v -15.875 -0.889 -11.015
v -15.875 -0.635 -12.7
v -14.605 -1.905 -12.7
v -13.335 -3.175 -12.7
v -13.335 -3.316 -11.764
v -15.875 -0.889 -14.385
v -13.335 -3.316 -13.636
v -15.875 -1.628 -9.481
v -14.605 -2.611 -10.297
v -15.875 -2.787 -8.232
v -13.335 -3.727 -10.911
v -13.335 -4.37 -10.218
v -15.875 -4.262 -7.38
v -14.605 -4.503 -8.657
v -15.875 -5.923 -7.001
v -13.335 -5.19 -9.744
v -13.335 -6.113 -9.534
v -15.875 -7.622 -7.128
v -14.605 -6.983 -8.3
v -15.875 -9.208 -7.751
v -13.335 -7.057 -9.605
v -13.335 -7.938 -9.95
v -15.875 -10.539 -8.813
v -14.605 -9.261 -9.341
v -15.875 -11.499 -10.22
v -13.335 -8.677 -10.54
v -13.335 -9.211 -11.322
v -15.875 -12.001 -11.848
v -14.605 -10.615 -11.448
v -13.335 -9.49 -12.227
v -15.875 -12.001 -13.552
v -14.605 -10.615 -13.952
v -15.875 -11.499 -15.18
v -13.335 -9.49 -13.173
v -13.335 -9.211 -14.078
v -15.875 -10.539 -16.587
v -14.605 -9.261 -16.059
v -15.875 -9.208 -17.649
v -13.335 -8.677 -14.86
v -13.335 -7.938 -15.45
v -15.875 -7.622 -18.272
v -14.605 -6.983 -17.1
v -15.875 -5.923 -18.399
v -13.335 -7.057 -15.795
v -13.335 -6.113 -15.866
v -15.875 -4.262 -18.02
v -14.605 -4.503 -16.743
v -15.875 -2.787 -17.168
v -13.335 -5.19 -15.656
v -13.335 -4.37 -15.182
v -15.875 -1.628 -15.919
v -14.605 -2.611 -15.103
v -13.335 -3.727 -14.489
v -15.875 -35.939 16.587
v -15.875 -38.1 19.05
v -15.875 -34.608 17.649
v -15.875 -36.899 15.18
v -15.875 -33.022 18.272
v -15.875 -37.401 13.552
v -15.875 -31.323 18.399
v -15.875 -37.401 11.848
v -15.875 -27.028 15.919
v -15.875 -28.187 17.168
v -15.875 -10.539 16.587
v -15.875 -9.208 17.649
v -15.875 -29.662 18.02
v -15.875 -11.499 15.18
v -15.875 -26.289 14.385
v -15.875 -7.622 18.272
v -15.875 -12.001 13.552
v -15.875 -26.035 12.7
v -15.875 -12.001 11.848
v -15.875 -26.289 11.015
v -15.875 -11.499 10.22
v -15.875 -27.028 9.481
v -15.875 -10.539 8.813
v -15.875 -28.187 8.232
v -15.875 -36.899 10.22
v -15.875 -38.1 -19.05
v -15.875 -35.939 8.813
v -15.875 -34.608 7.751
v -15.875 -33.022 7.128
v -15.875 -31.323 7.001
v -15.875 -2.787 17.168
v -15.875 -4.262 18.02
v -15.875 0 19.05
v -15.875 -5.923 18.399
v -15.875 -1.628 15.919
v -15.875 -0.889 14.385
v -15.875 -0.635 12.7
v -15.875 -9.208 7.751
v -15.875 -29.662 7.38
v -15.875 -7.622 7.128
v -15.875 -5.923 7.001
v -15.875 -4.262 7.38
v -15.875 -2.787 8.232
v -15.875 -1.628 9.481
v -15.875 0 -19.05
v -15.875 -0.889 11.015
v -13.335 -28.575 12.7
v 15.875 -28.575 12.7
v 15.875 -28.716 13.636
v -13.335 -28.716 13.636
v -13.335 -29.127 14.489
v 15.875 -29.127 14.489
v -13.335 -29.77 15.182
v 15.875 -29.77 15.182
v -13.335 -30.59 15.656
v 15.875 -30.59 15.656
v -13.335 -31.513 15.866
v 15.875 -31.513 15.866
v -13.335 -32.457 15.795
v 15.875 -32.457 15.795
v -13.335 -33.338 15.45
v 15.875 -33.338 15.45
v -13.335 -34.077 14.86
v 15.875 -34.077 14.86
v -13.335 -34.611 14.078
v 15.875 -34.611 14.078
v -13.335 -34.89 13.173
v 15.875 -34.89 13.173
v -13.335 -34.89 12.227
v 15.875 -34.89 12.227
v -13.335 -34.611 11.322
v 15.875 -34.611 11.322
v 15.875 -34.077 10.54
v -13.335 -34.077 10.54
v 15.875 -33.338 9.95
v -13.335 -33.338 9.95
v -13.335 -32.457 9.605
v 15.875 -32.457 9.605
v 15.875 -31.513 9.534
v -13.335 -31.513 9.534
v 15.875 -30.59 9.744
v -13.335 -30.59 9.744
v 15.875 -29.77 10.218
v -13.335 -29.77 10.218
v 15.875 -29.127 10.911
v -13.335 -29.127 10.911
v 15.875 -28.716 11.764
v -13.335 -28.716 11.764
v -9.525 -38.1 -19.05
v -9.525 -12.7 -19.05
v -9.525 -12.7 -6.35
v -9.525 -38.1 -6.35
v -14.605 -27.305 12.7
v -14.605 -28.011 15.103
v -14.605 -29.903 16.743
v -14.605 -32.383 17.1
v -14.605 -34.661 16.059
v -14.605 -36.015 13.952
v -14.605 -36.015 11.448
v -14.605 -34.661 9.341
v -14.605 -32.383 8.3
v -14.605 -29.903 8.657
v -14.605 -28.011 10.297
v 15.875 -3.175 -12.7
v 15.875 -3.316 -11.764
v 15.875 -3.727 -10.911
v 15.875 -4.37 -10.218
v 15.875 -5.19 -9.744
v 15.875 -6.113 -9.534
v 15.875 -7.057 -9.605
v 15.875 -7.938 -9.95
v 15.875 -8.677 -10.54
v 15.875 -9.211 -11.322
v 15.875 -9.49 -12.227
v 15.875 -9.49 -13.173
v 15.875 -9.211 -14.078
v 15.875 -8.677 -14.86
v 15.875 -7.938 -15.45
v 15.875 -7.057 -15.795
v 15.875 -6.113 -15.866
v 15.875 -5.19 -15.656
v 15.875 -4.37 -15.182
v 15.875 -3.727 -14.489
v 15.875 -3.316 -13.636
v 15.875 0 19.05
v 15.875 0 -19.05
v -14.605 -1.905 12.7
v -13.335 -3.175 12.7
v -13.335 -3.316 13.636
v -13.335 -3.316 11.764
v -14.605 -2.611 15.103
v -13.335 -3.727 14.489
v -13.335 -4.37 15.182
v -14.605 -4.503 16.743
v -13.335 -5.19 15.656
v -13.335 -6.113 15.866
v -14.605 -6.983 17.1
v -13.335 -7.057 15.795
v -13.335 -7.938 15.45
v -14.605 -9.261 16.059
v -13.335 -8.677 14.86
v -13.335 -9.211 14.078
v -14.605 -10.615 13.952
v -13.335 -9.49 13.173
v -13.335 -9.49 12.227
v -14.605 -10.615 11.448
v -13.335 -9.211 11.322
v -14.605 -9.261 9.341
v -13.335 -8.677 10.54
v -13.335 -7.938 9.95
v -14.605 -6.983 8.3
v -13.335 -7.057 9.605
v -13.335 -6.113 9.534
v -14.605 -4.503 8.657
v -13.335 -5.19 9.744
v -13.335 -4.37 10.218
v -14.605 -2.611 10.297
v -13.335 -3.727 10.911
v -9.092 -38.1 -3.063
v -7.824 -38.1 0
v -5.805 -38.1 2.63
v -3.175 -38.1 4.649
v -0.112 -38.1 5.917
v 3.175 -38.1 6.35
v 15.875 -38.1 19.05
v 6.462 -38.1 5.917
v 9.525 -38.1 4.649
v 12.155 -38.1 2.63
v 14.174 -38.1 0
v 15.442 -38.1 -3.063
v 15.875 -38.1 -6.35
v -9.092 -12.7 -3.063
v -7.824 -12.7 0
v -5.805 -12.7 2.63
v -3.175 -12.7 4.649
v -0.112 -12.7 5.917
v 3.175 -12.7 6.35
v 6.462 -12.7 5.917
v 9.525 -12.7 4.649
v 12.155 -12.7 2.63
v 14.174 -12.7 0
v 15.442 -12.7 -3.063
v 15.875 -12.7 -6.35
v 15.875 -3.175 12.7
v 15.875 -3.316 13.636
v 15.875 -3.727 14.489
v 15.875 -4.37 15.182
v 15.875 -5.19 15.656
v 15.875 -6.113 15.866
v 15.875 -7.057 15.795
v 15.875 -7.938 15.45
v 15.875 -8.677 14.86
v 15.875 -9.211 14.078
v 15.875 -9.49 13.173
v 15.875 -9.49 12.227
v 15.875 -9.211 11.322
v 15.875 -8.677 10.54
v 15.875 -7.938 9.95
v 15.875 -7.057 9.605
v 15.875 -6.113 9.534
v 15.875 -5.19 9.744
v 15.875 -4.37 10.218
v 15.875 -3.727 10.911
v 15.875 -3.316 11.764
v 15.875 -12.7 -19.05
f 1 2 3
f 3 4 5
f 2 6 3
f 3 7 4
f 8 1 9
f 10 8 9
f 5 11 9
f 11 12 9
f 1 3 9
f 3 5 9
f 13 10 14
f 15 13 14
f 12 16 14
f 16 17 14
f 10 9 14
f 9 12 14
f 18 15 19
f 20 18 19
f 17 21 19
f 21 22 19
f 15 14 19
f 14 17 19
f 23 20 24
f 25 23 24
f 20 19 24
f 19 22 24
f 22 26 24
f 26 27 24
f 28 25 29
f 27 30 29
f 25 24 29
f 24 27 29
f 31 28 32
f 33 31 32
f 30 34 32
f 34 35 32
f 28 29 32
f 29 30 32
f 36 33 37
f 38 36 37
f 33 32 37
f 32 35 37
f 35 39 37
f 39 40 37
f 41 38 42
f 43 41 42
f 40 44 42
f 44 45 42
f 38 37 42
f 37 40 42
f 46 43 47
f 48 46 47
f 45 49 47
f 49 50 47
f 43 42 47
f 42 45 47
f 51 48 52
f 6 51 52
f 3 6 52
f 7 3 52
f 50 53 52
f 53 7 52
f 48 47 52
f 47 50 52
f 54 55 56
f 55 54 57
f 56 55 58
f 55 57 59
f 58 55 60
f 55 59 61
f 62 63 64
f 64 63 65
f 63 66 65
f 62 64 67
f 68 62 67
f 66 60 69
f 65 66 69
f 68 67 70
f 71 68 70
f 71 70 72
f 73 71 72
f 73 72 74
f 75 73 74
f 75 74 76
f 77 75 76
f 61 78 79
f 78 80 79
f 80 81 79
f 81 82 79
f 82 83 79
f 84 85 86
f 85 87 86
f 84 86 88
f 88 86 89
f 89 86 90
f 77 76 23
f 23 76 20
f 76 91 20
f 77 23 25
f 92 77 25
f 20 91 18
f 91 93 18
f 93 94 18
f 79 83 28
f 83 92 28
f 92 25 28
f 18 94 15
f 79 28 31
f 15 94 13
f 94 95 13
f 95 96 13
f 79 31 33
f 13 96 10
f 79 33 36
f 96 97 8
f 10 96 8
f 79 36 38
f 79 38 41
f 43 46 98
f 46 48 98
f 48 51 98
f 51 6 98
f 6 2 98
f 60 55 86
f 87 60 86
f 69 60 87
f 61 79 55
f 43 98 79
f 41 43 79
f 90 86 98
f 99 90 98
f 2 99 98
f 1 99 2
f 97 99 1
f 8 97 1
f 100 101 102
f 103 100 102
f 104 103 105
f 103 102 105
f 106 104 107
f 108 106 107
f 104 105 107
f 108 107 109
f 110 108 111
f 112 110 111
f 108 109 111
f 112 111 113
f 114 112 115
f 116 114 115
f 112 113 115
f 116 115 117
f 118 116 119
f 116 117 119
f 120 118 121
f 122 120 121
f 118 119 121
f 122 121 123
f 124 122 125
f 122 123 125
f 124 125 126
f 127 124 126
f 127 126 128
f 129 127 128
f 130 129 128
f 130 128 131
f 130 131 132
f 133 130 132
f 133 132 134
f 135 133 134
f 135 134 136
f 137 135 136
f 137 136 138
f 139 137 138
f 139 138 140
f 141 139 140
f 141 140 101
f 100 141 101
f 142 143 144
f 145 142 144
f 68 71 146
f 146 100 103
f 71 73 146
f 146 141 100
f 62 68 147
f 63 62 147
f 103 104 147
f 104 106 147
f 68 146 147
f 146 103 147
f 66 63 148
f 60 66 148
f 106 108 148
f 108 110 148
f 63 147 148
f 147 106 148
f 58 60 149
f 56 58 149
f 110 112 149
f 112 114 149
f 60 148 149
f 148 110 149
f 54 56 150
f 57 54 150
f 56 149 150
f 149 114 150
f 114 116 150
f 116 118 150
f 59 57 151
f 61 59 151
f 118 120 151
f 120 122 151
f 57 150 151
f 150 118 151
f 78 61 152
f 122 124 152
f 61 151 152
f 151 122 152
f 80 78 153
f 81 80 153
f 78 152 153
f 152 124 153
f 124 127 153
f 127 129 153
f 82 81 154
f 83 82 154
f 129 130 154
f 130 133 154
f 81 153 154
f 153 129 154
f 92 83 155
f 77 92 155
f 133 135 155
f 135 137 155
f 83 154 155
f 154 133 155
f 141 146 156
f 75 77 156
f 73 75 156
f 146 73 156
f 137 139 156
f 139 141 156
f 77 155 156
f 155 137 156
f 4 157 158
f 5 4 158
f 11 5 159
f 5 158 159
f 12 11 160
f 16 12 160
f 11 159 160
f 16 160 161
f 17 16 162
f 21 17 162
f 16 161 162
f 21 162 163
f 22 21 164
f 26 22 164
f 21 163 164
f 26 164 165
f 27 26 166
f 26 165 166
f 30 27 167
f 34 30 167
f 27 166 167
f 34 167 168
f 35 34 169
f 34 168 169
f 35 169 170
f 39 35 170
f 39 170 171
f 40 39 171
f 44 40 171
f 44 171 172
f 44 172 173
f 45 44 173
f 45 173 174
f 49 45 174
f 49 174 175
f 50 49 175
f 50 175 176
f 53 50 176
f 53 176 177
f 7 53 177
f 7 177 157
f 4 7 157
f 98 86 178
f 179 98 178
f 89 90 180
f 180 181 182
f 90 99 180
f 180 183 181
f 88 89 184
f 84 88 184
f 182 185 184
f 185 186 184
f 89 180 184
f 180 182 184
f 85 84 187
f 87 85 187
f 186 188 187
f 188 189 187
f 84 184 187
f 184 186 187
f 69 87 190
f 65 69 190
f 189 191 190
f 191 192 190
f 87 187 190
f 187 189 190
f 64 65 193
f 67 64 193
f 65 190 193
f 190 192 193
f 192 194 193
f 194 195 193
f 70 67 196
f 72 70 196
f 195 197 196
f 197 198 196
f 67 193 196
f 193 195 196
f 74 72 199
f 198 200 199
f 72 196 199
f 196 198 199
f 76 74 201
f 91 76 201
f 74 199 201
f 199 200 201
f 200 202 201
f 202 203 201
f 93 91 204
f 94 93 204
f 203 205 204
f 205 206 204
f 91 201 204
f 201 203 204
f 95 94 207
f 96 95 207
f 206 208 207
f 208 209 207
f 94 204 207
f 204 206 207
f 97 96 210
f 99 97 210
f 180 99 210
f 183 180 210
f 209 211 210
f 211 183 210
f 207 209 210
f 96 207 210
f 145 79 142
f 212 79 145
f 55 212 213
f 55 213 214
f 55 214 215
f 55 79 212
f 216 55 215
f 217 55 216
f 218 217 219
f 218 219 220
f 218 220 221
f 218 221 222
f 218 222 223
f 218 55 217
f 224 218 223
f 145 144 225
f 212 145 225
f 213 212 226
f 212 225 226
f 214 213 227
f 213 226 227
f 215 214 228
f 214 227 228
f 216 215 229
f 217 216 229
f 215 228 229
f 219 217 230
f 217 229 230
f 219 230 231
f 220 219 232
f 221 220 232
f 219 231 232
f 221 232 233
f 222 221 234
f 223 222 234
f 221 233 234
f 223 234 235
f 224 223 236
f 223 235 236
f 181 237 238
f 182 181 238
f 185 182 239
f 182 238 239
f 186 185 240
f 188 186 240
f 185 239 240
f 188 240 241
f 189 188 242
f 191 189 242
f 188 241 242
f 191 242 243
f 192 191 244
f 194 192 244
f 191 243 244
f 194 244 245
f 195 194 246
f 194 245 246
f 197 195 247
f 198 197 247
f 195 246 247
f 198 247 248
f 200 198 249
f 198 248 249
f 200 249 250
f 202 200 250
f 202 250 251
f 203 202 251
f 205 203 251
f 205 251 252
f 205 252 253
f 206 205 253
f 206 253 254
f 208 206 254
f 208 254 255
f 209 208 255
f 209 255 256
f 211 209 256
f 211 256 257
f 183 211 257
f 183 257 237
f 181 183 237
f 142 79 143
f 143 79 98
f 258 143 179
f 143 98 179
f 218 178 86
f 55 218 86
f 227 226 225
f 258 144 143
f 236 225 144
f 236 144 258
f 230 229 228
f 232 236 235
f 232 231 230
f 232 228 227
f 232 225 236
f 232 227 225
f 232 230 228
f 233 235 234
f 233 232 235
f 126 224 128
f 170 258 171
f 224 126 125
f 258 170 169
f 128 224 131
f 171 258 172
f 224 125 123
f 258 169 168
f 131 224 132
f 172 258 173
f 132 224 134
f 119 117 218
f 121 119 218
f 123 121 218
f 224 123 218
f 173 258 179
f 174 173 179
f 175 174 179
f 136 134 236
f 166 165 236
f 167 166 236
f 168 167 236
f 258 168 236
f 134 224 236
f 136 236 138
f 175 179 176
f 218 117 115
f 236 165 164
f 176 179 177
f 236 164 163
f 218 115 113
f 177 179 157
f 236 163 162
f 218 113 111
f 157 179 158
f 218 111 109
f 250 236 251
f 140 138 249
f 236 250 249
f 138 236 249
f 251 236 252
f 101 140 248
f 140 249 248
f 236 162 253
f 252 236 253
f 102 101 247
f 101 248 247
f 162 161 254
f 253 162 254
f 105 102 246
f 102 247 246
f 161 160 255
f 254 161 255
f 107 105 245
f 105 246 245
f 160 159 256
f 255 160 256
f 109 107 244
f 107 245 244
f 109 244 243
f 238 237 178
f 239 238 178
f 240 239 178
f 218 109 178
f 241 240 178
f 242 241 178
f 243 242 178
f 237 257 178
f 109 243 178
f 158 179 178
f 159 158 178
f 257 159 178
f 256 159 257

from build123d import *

# Parameters (mm, degrees)
F1_DEPTH = 38.1
F2_DEPTH = 12.7
F3_R     = 3.175
F4_DEPTH = 31.751
F5_SIZE  = 2.54


with BuildPart() as f1:
    # F0 (on Front) → F1 (new body)
    with BuildSketch(Plane.XZ):
        with BuildLine():
            Line((15.875, -6.35), (15.875, 19.05))
            Line((15.875, 19.05), (-15.875, 19.05))
            Line((-15.875, 19.05), (-15.875, -19.05))
            Line((-15.875, -19.05), (-9.525, -19.05))
            Line((-9.525, -19.05), (-9.525, -6.35))
            ThreePointArc((-9.525, -6.35), (3.175, 6.35), (15.875, -6.35))
        make_face()
    extrude(amount=F1_DEPTH)

    # F0 (on Front) → F2 (join)
    with BuildSketch(Plane.XZ):
        with BuildLine():
            ThreePointArc((3.1749999328, -19.05), (12.1552560973, -15.3302561448), (15.875, -6.35))
            ThreePointArc((15.875, -6.35), (3.175, 6.35), (-9.525, -6.35))
            ThreePointArc((-9.525, -6.35), (-5.8052561448, -15.3302560973), (3.1749999328, -19.05))
        make_face()
        with BuildLine():
            Line((15.875, -19.05), (15.875, -6.35))
            ThreePointArc((15.875, -6.35), (12.1552560973, -15.3302561448), (3.1749999328, -19.05))
            Line((3.1749999328, -19.05), (15.875, -19.05))
        make_face()
        with BuildLine():
            ThreePointArc((3.1749999328, -19.05), (-5.8052561448, -15.3302560973), (-9.525, -6.35))
            Line((-9.525, -6.35), (-9.525, -19.05))
            Line((-9.525, -19.05), (3.1749999328, -19.05))
        make_face()
    extrude(amount=F2_DEPTH)

    # F3 (on face) → F4 (cut, through all)
    with BuildSketch(Plane.YZ.offset(15.875)):
        with Locations((-31.75, 12.7)):
            Circle(F3_R)
        with Locations((-6.35, 12.7)):
            Circle(F3_R)
        with Locations((-6.35, -12.7)):
            Circle(F3_R)
    extrude(amount=-F4_DEPTH, mode=Mode.SUBTRACT)

    # F5
    f5_edges = [f1.edges().sort_by_distance(p)[0] for p in [
        (-15.875, -9.525, -12.7),
        (-15.875, -9.525, 12.7),
        (-15.875, -34.925, 12.7),
    ]]
    chamfer(f5_edges, length=F5_SIZE)


solid = f1.part
